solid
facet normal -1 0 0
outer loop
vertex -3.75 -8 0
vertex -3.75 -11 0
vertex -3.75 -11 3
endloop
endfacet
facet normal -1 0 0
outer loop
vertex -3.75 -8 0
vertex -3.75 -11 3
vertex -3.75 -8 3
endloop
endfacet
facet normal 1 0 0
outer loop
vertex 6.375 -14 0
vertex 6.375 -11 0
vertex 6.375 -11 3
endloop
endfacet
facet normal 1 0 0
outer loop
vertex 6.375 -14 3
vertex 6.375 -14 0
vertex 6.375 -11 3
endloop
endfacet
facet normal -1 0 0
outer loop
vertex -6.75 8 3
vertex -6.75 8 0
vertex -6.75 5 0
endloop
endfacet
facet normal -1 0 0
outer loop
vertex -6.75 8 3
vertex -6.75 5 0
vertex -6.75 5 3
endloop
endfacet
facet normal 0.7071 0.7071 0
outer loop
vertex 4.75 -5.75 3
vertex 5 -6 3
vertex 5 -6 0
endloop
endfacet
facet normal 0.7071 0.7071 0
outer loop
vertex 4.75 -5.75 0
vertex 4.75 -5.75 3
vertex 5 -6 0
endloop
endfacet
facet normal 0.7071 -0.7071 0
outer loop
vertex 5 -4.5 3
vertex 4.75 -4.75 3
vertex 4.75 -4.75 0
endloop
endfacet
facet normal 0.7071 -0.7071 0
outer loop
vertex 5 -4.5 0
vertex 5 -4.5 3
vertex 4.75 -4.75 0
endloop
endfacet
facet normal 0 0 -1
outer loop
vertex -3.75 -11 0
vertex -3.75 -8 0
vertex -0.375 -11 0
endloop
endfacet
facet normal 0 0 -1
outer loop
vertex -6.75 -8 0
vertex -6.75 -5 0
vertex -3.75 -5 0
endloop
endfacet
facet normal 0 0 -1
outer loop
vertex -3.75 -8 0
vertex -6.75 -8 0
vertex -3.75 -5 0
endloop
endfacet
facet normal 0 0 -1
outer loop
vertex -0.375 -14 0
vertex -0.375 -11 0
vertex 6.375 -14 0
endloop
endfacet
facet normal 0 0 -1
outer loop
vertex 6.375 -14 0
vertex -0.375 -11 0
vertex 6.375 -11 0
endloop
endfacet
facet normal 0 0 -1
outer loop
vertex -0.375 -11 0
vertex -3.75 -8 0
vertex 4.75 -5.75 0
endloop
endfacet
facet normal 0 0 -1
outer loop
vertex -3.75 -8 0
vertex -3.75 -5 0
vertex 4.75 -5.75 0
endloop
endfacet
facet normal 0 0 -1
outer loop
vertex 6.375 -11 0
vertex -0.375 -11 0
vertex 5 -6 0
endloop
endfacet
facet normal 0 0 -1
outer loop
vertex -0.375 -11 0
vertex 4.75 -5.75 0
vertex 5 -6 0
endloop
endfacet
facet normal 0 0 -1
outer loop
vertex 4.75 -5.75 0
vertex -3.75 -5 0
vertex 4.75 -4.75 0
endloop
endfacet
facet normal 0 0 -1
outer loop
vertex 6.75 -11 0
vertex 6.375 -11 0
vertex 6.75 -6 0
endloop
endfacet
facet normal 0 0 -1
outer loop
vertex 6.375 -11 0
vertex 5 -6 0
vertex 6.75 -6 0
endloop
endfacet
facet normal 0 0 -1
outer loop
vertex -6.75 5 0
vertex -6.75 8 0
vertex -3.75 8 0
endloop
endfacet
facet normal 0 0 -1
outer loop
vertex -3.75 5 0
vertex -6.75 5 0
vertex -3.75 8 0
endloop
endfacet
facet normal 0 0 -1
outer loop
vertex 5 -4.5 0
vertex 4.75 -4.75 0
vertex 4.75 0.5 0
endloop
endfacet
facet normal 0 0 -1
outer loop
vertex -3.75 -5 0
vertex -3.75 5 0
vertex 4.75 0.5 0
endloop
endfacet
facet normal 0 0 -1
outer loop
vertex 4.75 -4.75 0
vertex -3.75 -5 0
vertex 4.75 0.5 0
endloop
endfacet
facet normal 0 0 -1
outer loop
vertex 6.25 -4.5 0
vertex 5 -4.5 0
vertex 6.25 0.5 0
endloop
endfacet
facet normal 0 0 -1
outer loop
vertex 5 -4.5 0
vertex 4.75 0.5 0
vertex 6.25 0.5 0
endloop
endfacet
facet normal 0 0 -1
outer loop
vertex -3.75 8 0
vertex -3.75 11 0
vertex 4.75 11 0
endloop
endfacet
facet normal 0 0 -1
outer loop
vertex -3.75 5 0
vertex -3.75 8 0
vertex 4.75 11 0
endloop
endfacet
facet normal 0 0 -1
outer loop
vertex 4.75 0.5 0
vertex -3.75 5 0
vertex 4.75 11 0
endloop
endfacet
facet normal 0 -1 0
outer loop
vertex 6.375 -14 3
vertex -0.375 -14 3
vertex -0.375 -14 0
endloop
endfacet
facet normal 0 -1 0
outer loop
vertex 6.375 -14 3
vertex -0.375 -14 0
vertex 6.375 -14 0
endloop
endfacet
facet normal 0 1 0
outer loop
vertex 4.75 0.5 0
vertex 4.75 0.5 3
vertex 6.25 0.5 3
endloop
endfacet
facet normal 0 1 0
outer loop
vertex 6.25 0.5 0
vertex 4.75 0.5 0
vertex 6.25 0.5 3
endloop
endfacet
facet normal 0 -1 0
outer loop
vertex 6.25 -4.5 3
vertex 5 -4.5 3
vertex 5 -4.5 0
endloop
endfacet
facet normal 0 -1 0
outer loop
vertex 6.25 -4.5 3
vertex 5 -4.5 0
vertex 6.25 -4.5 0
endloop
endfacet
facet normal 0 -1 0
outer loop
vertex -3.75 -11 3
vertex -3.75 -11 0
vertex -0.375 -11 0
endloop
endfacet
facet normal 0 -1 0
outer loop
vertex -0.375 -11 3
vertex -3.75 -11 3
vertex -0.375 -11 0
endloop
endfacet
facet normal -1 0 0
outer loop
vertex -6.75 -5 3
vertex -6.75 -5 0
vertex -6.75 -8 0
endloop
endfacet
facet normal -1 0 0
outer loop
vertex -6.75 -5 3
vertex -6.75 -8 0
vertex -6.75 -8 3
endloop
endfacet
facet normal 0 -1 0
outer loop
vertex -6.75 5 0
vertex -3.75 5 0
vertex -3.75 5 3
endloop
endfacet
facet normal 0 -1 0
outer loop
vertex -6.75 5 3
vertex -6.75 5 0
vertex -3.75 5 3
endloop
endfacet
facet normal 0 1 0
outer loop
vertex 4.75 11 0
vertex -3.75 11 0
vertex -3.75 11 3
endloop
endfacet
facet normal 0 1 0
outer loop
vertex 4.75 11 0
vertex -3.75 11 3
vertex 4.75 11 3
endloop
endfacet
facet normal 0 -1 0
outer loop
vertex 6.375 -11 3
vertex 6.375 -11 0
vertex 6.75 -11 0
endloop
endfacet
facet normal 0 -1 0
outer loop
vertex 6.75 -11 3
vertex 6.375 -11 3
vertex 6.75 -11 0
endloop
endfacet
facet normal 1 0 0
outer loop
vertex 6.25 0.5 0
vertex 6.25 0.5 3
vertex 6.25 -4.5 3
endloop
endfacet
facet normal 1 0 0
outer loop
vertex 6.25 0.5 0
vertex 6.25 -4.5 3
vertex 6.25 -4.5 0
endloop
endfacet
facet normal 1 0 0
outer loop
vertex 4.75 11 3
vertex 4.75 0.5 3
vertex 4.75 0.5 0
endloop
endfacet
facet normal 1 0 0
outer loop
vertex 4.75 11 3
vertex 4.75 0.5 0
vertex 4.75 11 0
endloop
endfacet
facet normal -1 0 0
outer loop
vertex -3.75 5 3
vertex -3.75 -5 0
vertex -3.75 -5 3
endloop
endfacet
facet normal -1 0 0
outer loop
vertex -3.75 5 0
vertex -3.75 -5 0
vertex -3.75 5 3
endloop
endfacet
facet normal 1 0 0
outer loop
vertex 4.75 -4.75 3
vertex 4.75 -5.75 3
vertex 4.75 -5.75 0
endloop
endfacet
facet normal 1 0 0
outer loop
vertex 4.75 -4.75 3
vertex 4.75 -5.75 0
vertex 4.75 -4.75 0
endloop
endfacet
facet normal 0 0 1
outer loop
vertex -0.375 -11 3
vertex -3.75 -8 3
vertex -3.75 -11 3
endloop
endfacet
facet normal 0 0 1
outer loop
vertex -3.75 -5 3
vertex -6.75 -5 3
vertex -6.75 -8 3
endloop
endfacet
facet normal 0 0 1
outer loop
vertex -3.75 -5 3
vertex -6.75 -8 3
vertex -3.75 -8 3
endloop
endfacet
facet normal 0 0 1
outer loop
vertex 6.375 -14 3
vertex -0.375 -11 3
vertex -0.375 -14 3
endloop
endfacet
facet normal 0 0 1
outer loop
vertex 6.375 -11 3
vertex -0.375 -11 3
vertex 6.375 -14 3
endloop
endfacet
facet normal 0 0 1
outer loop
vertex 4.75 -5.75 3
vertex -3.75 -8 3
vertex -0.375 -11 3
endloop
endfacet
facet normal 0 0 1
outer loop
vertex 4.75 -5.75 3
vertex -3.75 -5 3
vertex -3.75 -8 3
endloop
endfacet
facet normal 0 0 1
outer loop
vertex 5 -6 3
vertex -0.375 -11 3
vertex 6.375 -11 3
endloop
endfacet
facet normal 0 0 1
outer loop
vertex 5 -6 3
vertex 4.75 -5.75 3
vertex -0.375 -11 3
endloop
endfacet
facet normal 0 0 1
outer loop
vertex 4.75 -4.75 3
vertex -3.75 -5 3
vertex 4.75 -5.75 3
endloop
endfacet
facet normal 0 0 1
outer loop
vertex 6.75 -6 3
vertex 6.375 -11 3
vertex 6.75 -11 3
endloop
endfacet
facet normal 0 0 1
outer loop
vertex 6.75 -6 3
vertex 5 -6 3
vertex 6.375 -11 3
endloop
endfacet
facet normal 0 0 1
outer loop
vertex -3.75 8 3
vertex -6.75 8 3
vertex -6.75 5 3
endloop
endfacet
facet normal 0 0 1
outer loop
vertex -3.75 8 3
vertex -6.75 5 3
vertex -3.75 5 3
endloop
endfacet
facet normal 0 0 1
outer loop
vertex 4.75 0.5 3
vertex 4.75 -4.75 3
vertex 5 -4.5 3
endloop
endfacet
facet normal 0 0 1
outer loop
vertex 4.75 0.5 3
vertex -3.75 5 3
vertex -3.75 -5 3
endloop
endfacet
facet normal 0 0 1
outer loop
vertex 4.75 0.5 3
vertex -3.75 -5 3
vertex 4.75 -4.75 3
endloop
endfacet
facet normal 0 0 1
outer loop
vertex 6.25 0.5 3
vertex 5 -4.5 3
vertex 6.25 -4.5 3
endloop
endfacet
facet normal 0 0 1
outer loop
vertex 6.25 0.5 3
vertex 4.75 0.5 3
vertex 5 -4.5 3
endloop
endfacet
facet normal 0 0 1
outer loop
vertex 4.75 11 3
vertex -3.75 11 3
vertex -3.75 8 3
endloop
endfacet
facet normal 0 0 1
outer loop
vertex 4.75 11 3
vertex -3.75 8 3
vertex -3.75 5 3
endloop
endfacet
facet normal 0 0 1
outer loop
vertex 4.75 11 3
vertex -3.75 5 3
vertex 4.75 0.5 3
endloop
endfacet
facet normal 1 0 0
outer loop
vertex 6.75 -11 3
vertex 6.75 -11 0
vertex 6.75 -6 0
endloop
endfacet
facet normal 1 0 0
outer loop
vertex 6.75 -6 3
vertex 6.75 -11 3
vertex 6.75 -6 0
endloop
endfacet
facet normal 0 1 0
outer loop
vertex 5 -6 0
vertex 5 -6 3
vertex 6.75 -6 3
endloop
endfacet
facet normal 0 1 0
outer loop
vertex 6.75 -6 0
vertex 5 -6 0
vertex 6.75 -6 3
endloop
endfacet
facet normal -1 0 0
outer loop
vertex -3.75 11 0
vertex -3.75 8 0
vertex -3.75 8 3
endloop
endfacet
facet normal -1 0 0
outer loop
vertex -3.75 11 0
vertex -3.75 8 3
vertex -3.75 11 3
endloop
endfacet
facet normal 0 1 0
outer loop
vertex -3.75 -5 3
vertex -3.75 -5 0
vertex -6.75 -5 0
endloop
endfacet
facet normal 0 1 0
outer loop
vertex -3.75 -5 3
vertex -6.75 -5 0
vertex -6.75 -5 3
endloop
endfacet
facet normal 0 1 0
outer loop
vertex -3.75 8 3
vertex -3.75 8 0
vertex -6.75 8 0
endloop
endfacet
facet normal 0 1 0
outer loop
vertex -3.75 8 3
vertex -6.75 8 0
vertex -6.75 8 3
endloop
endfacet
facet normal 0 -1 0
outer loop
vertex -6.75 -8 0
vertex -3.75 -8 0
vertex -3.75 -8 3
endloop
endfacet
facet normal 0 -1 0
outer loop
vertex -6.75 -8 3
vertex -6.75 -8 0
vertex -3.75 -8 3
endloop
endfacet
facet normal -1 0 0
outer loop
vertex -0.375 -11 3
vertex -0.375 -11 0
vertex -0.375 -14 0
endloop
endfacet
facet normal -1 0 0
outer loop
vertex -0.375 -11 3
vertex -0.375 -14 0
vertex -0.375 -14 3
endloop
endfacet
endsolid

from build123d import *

# Parameters (mm, degrees)
SKETCH1_W           = 10.5
SKETCH1_H           = 22
BOSS_EXTRUDE1_DEPTH = 3
SKETCH2_W           = 6.75
SKETCH2_H           = 3
BOSS_EXTRUDE2_DEPTH = 3
SKETCH3_W           = 3
SKETCH3_H           = 3
BOSS_EXTRUDE3_DEPTH = 3
SKETCH4_W           = 2
SKETCH4_H           = 1.5
CUT_EXTRUDE1_DEPTH  = 3
SKETCH5_W           = 2
SKETCH5_H           = 10.5
CUT_EXTRUDE2_DEPTH  = 3
CHAMFER1_SIZE       = 0.25
CHAMFER2_SIZE       = 0.25
SKETCH6_W           = 3
SKETCH6_H           = 5
CUT_EXTRUDE3_DEPTH  = 0.5


with BuildPart() as part:
    # Sketch1 → Boss-Extrude1 (new body)
    with BuildSketch(Plane.XY):
        with Locations((1.5, 0)):
            Rectangle(SKETCH1_W, SKETCH1_H)
    extrude(amount=BOSS_EXTRUDE1_DEPTH)

    # Sketch2 → Boss-Extrude2 (add)
    with BuildSketch(Plane.XZ.offset(11)):
        with Locations((3, 1.5)):
            Rectangle(SKETCH2_W, SKETCH2_H)
    extrude(amount=BOSS_EXTRUDE2_DEPTH)

    # Sketch3 → Boss-Extrude3 (add)
    with BuildSketch(Plane.ZY.offset(3.75)):
        with Locations((1.5, -6.5)):
            Rectangle(SKETCH3_W, SKETCH3_H)
        with Locations((1.5, 6.5)):
            Rectangle(SKETCH3_W, SKETCH3_H)
    extrude(amount=BOSS_EXTRUDE3_DEPTH)

    # Sketch4 → Cut-Extrude1 (cut)
    with BuildSketch(Plane.XY.offset(3)):
        with Locations((5.75, -5.25)):
            Rectangle(SKETCH4_W, SKETCH4_H)
    extrude(amount=-CUT_EXTRUDE1_DEPTH, mode=Mode.SUBTRACT)

    # Sketch5 → Cut-Extrude2 (cut)
    with BuildSketch(Plane.XY.offset(3)):
        with Locations((5.75, 5.75)):
            Rectangle(SKETCH5_W, SKETCH5_H)
    extrude(amount=-CUT_EXTRUDE2_DEPTH, mode=Mode.SUBTRACT)

    # Chamfer1
    chamfer1_edges = [part.edges().sort_by_distance(p)[0] for p in [
        (4.75, -4.5, 1.5),
    ]]
    chamfer(chamfer1_edges, length=CHAMFER1_SIZE)

    # Chamfer2
    chamfer2_edges = [part.edges().sort_by_distance(p)[0] for p in [
        (4.75, -6, 1.5),
    ]]
    chamfer(chamfer2_edges, length=CHAMFER2_SIZE)

    # Sketch6 → Cut-Extrude3 (cut)
    with BuildSketch(Plane(origin=(6.75, 0, 0), x_dir=(0, 0, -1), z_dir=(1, 0, 0))):
        with Locations((-1.5, -2)):
            Rectangle(SKETCH6_W, SKETCH6_H)
    extrude(amount=-CUT_EXTRUDE3_DEPTH, mode=Mode.SUBTRACT)


solid = part.part
